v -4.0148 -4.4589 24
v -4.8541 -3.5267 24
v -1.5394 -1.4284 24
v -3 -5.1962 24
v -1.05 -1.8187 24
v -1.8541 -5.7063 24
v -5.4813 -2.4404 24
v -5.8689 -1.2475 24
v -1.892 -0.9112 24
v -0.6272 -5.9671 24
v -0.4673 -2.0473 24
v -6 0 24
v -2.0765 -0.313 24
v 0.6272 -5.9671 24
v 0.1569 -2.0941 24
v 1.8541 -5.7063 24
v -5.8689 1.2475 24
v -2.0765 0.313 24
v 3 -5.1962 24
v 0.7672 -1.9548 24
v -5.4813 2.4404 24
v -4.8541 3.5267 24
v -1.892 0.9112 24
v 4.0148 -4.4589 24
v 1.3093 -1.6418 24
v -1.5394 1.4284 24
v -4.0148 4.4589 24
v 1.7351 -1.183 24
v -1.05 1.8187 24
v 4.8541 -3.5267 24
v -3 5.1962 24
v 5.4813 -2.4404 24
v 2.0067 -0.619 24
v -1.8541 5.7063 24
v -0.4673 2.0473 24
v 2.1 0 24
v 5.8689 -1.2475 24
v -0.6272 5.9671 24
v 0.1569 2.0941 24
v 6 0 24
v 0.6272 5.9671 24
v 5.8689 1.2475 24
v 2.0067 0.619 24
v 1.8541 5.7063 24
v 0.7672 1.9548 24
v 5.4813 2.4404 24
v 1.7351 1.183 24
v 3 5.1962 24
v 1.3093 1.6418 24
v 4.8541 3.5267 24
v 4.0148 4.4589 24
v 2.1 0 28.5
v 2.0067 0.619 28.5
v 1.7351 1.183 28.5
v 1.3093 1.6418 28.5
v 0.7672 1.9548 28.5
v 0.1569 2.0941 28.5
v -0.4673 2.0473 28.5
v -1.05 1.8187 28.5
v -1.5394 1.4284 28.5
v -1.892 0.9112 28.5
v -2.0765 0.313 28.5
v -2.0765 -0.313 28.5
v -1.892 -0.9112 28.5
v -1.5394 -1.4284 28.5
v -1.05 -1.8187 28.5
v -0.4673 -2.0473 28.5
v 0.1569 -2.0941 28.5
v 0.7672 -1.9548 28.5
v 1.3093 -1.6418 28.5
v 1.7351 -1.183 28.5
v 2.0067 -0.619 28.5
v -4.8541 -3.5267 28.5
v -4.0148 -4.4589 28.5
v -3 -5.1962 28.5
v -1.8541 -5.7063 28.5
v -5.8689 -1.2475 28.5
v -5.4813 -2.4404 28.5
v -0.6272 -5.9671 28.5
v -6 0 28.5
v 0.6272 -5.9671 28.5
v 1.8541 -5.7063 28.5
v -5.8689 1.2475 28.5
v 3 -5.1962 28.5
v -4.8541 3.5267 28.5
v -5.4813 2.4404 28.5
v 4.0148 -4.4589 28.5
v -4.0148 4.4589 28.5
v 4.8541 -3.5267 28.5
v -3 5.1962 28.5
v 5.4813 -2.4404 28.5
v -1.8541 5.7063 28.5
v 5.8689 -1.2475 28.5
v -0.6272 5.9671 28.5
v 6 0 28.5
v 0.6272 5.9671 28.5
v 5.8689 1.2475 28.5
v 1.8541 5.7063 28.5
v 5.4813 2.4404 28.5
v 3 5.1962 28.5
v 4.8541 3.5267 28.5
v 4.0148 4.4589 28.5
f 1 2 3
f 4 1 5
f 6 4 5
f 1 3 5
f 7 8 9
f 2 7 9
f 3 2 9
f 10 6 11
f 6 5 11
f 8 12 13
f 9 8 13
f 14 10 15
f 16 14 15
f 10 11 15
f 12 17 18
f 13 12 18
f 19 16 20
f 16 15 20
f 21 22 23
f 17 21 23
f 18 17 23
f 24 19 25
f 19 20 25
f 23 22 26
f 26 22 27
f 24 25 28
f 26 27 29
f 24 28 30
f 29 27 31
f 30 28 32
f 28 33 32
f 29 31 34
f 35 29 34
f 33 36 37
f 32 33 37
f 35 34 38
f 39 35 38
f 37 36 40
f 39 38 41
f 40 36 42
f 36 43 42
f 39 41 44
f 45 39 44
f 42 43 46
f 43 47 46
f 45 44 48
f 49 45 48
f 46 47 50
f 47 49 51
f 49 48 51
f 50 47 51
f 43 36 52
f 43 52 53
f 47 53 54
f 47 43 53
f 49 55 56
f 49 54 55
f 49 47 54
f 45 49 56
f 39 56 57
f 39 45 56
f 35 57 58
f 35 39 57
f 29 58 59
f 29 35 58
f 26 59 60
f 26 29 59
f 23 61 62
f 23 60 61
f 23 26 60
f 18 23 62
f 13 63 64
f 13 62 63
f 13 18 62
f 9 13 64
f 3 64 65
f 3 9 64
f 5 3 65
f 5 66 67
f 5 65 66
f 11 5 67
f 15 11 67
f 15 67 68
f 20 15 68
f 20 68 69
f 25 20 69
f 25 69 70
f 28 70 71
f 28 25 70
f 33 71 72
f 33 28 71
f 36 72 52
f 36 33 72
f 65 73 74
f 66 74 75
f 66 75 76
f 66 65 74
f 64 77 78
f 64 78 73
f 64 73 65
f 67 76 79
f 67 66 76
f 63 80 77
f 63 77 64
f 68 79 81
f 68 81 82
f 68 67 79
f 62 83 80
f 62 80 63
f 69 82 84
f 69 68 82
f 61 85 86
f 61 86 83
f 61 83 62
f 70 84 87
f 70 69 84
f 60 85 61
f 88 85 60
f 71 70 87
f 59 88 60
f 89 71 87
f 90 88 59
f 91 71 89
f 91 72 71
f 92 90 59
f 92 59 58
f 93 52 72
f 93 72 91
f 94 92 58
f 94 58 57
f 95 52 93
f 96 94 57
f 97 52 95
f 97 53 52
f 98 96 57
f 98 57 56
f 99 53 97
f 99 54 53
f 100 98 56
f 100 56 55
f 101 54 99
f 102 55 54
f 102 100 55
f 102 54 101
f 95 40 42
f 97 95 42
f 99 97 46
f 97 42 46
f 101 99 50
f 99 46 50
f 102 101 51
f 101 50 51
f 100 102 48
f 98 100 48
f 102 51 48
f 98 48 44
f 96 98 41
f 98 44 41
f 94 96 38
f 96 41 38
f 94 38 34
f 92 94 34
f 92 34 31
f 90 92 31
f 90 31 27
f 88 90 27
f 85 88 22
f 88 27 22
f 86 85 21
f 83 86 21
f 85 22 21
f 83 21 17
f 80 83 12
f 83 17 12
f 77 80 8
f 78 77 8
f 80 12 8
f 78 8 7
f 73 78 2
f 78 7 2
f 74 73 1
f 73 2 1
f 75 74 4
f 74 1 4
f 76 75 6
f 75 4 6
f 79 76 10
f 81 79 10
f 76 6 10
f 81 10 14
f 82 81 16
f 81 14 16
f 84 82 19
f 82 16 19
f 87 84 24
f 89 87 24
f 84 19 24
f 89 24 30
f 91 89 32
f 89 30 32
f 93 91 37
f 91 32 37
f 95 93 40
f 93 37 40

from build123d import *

# Parameters (mm, degrees)
CYLINDER037_R     = 2.1
CYLINDER037_DEPTH = 33.5
CYLINDER036_R     = 6
CYLINDER036_DEPTH = 4.5


with BuildPart() as cylinder037:
    # Cylinder037 → Cylinder037 (new body)
    with BuildSketch(Plane.XY.offset(-4.6)):
        Circle(CYLINDER037_R)
    extrude(amount=CYLINDER037_DEPTH)


with BuildPart() as cut028:
    # Cylinder036 → Cylinder036 (new body)
    with BuildSketch(Plane.XY.offset(24)):
        Circle(CYLINDER036_R)
    extrude(amount=CYLINDER036_DEPTH)

    # Cut028: cut Cylinder037
    add(cylinder037.part, mode=Mode.SUBTRACT)


solid = cut028.part
